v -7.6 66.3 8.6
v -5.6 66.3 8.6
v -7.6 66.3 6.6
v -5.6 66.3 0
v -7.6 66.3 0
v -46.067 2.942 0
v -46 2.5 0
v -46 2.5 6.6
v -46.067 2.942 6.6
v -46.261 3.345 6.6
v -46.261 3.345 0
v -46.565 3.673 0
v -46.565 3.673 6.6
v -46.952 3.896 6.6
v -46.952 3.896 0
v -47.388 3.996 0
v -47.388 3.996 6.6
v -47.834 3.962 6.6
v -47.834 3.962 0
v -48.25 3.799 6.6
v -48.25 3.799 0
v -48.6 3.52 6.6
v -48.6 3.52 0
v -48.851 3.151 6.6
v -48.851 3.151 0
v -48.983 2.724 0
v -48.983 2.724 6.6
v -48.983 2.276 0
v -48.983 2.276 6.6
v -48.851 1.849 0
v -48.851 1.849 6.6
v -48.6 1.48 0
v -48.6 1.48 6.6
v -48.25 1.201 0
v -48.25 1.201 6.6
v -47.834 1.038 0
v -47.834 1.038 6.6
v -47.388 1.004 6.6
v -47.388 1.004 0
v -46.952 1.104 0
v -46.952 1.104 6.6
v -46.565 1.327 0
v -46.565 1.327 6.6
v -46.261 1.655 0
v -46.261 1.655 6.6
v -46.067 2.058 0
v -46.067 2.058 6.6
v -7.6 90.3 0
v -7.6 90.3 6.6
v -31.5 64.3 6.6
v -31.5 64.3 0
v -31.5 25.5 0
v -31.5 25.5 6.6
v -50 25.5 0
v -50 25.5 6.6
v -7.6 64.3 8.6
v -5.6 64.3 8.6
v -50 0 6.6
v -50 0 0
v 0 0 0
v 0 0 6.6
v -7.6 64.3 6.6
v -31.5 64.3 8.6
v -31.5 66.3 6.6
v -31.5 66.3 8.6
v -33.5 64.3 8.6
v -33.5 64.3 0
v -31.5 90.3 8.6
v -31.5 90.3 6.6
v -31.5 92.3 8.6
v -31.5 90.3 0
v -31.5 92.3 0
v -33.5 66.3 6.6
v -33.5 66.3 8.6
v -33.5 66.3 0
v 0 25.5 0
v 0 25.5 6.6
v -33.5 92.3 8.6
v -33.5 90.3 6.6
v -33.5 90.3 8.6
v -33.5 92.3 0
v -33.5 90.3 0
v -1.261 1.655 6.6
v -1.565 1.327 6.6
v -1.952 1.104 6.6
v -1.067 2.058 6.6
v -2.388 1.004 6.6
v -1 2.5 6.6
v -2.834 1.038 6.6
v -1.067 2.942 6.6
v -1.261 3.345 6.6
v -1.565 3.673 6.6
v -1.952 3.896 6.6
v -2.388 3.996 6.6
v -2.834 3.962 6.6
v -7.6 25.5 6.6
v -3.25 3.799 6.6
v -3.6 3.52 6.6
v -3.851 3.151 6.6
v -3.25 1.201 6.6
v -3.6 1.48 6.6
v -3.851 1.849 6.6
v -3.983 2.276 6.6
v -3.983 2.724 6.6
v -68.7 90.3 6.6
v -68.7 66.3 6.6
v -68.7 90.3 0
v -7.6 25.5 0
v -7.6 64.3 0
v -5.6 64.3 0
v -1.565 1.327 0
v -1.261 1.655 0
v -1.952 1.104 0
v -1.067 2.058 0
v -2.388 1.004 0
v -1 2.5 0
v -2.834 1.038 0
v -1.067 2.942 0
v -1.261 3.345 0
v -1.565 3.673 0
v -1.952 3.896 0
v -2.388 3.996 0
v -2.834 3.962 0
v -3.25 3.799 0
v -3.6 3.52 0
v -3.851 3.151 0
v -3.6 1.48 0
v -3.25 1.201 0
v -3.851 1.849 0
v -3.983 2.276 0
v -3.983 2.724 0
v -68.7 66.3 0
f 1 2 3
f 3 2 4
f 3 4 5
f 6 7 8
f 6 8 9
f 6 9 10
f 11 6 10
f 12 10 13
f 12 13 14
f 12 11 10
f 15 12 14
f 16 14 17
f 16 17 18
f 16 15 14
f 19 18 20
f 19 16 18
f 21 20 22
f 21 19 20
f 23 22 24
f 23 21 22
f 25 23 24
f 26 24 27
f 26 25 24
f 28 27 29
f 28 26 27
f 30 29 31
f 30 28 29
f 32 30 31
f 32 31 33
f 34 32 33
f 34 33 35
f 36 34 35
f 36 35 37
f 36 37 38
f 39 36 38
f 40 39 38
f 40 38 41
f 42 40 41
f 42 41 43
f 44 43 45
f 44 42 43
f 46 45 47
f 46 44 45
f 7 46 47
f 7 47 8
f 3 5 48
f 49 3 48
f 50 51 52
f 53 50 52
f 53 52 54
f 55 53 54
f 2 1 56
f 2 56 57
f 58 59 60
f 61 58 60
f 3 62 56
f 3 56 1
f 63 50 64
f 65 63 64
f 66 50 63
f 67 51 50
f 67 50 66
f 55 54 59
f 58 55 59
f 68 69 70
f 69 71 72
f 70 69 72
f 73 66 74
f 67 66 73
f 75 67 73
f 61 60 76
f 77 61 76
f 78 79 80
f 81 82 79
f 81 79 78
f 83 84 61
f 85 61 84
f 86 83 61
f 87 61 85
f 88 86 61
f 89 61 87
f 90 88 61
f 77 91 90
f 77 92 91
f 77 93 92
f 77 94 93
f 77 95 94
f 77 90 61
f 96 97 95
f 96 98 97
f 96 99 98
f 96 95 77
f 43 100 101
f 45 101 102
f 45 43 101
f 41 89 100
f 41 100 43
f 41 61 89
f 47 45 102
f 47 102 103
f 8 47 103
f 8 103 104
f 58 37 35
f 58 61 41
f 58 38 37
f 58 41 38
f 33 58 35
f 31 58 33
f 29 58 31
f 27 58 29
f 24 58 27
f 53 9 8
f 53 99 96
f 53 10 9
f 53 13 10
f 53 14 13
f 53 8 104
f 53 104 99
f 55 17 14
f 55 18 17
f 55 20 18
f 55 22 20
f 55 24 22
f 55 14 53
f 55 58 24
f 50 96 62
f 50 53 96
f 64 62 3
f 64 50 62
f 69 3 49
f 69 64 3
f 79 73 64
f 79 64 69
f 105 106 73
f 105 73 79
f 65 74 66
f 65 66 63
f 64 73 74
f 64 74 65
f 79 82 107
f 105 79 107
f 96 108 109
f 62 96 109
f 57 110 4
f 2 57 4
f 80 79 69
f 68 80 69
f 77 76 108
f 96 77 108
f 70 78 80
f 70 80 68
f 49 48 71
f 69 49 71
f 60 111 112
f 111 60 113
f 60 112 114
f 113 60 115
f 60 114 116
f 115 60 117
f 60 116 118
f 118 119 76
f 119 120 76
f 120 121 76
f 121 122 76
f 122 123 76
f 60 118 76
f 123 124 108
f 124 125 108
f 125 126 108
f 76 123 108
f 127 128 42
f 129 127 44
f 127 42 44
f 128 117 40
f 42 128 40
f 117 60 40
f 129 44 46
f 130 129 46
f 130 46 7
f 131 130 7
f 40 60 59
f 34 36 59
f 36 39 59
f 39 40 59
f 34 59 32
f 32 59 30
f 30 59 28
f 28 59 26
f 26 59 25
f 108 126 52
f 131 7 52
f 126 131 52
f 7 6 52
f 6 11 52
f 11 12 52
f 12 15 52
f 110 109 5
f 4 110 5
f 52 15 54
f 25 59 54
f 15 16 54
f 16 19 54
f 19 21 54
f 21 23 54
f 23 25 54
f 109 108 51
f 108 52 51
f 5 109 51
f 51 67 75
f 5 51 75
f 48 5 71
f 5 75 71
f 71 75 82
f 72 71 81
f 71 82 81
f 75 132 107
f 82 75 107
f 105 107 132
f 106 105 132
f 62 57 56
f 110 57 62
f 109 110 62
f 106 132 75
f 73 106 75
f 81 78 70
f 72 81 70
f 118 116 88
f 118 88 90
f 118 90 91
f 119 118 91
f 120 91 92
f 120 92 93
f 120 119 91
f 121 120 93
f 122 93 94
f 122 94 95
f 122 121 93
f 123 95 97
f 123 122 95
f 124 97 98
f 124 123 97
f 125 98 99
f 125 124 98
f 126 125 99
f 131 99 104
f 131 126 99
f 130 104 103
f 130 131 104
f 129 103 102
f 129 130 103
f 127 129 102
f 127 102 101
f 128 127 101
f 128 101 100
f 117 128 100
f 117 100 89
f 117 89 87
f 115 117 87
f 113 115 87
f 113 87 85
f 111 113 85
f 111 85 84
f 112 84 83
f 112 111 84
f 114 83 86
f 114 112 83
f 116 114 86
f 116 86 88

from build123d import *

# Parameters (mm, degrees)
IZIM1_R                     = 1.5
Y_KSEKLIK_EKSTR_ZYON1_DEPTH = 6.6
IZIM3_W                     = 2
IZIM3_H                     = 2
Y_KSEKLIK_EKSTR_ZYON3_DEPTH = 6.6
IZIM4_W                     = 2
IZIM4_H                     = 2
Y_KSEKLIK_EKSTR_ZYON4_DEPTH = 2


with BuildPart() as part:
    # Çizim1 → Yükseklik-Ekstrüzyon1 (new body)
    # profile 1 of 2: a face of its own
    with BuildSketch(Plane(origin=(0, 0, 0), x_dir=(0, 1, 0), z_dir=(0, 0, 1))):
        Polygon((0, 50), (0, 0), (25.5, 0), (25.5, 7.6), (25.5, 31.5), (25.5, 50), align=None)
        with Locations(Location((2.5, 2.5, 0), (0, 0, 270))):
            Circle(IZIM1_R, mode=Mode.SUBTRACT)
        with Locations(Location((2.5, 47.5, 0), (0, 0, 270))):
            Circle(IZIM1_R, mode=Mode.SUBTRACT)
    # profile 2 of 2: a face of its own
    with BuildSketch(Plane(origin=(0, 0, 0), x_dir=(0, 1, 0), z_dir=(0, 0, 1))):
        Polygon((25.5, 31.5), (25.5, 7.6), (90.3, 7.6), (90.3, 68.7), (66.3, 68.7), (66.3, 31.5), align=None)
    extrude(amount=Y_KSEKLIK_EKSTR_ZYON1_DEPTH)

    # Çizim3 → Yükseklik-Ekstrüzyon3 (add)
    with BuildSketch(Plane(origin=(0, 0, 0), x_dir=(0, 1, 0), z_dir=(0, 0, 1))):
        with Locations((65.3, 32.5)):
            Rectangle(IZIM3_W, IZIM3_H)
        with Locations((91.3, 32.5)):
            Rectangle(IZIM3_W, IZIM3_H)
        with Locations((65.3, 6.6)):
            Rectangle(IZIM3_W, IZIM3_H)
    extrude(amount=Y_KSEKLIK_EKSTR_ZYON3_DEPTH)

    # Çizim4 → Yükseklik-Ekstrüzyon4 (add)
    with BuildSketch(Plane.XY.offset(6.6)):
        with Locations((-32.5, 91.3)):
            Rectangle(IZIM4_W, IZIM4_H)
        with Locations((-32.5, 65.3)):
            Rectangle(IZIM4_W, IZIM4_H)
        with Locations((-6.6, 65.3)):
            Rectangle(IZIM4_W, IZIM4_H)
    extrude(amount=Y_KSEKLIK_EKSTR_ZYON4_DEPTH)


solid = part.part
